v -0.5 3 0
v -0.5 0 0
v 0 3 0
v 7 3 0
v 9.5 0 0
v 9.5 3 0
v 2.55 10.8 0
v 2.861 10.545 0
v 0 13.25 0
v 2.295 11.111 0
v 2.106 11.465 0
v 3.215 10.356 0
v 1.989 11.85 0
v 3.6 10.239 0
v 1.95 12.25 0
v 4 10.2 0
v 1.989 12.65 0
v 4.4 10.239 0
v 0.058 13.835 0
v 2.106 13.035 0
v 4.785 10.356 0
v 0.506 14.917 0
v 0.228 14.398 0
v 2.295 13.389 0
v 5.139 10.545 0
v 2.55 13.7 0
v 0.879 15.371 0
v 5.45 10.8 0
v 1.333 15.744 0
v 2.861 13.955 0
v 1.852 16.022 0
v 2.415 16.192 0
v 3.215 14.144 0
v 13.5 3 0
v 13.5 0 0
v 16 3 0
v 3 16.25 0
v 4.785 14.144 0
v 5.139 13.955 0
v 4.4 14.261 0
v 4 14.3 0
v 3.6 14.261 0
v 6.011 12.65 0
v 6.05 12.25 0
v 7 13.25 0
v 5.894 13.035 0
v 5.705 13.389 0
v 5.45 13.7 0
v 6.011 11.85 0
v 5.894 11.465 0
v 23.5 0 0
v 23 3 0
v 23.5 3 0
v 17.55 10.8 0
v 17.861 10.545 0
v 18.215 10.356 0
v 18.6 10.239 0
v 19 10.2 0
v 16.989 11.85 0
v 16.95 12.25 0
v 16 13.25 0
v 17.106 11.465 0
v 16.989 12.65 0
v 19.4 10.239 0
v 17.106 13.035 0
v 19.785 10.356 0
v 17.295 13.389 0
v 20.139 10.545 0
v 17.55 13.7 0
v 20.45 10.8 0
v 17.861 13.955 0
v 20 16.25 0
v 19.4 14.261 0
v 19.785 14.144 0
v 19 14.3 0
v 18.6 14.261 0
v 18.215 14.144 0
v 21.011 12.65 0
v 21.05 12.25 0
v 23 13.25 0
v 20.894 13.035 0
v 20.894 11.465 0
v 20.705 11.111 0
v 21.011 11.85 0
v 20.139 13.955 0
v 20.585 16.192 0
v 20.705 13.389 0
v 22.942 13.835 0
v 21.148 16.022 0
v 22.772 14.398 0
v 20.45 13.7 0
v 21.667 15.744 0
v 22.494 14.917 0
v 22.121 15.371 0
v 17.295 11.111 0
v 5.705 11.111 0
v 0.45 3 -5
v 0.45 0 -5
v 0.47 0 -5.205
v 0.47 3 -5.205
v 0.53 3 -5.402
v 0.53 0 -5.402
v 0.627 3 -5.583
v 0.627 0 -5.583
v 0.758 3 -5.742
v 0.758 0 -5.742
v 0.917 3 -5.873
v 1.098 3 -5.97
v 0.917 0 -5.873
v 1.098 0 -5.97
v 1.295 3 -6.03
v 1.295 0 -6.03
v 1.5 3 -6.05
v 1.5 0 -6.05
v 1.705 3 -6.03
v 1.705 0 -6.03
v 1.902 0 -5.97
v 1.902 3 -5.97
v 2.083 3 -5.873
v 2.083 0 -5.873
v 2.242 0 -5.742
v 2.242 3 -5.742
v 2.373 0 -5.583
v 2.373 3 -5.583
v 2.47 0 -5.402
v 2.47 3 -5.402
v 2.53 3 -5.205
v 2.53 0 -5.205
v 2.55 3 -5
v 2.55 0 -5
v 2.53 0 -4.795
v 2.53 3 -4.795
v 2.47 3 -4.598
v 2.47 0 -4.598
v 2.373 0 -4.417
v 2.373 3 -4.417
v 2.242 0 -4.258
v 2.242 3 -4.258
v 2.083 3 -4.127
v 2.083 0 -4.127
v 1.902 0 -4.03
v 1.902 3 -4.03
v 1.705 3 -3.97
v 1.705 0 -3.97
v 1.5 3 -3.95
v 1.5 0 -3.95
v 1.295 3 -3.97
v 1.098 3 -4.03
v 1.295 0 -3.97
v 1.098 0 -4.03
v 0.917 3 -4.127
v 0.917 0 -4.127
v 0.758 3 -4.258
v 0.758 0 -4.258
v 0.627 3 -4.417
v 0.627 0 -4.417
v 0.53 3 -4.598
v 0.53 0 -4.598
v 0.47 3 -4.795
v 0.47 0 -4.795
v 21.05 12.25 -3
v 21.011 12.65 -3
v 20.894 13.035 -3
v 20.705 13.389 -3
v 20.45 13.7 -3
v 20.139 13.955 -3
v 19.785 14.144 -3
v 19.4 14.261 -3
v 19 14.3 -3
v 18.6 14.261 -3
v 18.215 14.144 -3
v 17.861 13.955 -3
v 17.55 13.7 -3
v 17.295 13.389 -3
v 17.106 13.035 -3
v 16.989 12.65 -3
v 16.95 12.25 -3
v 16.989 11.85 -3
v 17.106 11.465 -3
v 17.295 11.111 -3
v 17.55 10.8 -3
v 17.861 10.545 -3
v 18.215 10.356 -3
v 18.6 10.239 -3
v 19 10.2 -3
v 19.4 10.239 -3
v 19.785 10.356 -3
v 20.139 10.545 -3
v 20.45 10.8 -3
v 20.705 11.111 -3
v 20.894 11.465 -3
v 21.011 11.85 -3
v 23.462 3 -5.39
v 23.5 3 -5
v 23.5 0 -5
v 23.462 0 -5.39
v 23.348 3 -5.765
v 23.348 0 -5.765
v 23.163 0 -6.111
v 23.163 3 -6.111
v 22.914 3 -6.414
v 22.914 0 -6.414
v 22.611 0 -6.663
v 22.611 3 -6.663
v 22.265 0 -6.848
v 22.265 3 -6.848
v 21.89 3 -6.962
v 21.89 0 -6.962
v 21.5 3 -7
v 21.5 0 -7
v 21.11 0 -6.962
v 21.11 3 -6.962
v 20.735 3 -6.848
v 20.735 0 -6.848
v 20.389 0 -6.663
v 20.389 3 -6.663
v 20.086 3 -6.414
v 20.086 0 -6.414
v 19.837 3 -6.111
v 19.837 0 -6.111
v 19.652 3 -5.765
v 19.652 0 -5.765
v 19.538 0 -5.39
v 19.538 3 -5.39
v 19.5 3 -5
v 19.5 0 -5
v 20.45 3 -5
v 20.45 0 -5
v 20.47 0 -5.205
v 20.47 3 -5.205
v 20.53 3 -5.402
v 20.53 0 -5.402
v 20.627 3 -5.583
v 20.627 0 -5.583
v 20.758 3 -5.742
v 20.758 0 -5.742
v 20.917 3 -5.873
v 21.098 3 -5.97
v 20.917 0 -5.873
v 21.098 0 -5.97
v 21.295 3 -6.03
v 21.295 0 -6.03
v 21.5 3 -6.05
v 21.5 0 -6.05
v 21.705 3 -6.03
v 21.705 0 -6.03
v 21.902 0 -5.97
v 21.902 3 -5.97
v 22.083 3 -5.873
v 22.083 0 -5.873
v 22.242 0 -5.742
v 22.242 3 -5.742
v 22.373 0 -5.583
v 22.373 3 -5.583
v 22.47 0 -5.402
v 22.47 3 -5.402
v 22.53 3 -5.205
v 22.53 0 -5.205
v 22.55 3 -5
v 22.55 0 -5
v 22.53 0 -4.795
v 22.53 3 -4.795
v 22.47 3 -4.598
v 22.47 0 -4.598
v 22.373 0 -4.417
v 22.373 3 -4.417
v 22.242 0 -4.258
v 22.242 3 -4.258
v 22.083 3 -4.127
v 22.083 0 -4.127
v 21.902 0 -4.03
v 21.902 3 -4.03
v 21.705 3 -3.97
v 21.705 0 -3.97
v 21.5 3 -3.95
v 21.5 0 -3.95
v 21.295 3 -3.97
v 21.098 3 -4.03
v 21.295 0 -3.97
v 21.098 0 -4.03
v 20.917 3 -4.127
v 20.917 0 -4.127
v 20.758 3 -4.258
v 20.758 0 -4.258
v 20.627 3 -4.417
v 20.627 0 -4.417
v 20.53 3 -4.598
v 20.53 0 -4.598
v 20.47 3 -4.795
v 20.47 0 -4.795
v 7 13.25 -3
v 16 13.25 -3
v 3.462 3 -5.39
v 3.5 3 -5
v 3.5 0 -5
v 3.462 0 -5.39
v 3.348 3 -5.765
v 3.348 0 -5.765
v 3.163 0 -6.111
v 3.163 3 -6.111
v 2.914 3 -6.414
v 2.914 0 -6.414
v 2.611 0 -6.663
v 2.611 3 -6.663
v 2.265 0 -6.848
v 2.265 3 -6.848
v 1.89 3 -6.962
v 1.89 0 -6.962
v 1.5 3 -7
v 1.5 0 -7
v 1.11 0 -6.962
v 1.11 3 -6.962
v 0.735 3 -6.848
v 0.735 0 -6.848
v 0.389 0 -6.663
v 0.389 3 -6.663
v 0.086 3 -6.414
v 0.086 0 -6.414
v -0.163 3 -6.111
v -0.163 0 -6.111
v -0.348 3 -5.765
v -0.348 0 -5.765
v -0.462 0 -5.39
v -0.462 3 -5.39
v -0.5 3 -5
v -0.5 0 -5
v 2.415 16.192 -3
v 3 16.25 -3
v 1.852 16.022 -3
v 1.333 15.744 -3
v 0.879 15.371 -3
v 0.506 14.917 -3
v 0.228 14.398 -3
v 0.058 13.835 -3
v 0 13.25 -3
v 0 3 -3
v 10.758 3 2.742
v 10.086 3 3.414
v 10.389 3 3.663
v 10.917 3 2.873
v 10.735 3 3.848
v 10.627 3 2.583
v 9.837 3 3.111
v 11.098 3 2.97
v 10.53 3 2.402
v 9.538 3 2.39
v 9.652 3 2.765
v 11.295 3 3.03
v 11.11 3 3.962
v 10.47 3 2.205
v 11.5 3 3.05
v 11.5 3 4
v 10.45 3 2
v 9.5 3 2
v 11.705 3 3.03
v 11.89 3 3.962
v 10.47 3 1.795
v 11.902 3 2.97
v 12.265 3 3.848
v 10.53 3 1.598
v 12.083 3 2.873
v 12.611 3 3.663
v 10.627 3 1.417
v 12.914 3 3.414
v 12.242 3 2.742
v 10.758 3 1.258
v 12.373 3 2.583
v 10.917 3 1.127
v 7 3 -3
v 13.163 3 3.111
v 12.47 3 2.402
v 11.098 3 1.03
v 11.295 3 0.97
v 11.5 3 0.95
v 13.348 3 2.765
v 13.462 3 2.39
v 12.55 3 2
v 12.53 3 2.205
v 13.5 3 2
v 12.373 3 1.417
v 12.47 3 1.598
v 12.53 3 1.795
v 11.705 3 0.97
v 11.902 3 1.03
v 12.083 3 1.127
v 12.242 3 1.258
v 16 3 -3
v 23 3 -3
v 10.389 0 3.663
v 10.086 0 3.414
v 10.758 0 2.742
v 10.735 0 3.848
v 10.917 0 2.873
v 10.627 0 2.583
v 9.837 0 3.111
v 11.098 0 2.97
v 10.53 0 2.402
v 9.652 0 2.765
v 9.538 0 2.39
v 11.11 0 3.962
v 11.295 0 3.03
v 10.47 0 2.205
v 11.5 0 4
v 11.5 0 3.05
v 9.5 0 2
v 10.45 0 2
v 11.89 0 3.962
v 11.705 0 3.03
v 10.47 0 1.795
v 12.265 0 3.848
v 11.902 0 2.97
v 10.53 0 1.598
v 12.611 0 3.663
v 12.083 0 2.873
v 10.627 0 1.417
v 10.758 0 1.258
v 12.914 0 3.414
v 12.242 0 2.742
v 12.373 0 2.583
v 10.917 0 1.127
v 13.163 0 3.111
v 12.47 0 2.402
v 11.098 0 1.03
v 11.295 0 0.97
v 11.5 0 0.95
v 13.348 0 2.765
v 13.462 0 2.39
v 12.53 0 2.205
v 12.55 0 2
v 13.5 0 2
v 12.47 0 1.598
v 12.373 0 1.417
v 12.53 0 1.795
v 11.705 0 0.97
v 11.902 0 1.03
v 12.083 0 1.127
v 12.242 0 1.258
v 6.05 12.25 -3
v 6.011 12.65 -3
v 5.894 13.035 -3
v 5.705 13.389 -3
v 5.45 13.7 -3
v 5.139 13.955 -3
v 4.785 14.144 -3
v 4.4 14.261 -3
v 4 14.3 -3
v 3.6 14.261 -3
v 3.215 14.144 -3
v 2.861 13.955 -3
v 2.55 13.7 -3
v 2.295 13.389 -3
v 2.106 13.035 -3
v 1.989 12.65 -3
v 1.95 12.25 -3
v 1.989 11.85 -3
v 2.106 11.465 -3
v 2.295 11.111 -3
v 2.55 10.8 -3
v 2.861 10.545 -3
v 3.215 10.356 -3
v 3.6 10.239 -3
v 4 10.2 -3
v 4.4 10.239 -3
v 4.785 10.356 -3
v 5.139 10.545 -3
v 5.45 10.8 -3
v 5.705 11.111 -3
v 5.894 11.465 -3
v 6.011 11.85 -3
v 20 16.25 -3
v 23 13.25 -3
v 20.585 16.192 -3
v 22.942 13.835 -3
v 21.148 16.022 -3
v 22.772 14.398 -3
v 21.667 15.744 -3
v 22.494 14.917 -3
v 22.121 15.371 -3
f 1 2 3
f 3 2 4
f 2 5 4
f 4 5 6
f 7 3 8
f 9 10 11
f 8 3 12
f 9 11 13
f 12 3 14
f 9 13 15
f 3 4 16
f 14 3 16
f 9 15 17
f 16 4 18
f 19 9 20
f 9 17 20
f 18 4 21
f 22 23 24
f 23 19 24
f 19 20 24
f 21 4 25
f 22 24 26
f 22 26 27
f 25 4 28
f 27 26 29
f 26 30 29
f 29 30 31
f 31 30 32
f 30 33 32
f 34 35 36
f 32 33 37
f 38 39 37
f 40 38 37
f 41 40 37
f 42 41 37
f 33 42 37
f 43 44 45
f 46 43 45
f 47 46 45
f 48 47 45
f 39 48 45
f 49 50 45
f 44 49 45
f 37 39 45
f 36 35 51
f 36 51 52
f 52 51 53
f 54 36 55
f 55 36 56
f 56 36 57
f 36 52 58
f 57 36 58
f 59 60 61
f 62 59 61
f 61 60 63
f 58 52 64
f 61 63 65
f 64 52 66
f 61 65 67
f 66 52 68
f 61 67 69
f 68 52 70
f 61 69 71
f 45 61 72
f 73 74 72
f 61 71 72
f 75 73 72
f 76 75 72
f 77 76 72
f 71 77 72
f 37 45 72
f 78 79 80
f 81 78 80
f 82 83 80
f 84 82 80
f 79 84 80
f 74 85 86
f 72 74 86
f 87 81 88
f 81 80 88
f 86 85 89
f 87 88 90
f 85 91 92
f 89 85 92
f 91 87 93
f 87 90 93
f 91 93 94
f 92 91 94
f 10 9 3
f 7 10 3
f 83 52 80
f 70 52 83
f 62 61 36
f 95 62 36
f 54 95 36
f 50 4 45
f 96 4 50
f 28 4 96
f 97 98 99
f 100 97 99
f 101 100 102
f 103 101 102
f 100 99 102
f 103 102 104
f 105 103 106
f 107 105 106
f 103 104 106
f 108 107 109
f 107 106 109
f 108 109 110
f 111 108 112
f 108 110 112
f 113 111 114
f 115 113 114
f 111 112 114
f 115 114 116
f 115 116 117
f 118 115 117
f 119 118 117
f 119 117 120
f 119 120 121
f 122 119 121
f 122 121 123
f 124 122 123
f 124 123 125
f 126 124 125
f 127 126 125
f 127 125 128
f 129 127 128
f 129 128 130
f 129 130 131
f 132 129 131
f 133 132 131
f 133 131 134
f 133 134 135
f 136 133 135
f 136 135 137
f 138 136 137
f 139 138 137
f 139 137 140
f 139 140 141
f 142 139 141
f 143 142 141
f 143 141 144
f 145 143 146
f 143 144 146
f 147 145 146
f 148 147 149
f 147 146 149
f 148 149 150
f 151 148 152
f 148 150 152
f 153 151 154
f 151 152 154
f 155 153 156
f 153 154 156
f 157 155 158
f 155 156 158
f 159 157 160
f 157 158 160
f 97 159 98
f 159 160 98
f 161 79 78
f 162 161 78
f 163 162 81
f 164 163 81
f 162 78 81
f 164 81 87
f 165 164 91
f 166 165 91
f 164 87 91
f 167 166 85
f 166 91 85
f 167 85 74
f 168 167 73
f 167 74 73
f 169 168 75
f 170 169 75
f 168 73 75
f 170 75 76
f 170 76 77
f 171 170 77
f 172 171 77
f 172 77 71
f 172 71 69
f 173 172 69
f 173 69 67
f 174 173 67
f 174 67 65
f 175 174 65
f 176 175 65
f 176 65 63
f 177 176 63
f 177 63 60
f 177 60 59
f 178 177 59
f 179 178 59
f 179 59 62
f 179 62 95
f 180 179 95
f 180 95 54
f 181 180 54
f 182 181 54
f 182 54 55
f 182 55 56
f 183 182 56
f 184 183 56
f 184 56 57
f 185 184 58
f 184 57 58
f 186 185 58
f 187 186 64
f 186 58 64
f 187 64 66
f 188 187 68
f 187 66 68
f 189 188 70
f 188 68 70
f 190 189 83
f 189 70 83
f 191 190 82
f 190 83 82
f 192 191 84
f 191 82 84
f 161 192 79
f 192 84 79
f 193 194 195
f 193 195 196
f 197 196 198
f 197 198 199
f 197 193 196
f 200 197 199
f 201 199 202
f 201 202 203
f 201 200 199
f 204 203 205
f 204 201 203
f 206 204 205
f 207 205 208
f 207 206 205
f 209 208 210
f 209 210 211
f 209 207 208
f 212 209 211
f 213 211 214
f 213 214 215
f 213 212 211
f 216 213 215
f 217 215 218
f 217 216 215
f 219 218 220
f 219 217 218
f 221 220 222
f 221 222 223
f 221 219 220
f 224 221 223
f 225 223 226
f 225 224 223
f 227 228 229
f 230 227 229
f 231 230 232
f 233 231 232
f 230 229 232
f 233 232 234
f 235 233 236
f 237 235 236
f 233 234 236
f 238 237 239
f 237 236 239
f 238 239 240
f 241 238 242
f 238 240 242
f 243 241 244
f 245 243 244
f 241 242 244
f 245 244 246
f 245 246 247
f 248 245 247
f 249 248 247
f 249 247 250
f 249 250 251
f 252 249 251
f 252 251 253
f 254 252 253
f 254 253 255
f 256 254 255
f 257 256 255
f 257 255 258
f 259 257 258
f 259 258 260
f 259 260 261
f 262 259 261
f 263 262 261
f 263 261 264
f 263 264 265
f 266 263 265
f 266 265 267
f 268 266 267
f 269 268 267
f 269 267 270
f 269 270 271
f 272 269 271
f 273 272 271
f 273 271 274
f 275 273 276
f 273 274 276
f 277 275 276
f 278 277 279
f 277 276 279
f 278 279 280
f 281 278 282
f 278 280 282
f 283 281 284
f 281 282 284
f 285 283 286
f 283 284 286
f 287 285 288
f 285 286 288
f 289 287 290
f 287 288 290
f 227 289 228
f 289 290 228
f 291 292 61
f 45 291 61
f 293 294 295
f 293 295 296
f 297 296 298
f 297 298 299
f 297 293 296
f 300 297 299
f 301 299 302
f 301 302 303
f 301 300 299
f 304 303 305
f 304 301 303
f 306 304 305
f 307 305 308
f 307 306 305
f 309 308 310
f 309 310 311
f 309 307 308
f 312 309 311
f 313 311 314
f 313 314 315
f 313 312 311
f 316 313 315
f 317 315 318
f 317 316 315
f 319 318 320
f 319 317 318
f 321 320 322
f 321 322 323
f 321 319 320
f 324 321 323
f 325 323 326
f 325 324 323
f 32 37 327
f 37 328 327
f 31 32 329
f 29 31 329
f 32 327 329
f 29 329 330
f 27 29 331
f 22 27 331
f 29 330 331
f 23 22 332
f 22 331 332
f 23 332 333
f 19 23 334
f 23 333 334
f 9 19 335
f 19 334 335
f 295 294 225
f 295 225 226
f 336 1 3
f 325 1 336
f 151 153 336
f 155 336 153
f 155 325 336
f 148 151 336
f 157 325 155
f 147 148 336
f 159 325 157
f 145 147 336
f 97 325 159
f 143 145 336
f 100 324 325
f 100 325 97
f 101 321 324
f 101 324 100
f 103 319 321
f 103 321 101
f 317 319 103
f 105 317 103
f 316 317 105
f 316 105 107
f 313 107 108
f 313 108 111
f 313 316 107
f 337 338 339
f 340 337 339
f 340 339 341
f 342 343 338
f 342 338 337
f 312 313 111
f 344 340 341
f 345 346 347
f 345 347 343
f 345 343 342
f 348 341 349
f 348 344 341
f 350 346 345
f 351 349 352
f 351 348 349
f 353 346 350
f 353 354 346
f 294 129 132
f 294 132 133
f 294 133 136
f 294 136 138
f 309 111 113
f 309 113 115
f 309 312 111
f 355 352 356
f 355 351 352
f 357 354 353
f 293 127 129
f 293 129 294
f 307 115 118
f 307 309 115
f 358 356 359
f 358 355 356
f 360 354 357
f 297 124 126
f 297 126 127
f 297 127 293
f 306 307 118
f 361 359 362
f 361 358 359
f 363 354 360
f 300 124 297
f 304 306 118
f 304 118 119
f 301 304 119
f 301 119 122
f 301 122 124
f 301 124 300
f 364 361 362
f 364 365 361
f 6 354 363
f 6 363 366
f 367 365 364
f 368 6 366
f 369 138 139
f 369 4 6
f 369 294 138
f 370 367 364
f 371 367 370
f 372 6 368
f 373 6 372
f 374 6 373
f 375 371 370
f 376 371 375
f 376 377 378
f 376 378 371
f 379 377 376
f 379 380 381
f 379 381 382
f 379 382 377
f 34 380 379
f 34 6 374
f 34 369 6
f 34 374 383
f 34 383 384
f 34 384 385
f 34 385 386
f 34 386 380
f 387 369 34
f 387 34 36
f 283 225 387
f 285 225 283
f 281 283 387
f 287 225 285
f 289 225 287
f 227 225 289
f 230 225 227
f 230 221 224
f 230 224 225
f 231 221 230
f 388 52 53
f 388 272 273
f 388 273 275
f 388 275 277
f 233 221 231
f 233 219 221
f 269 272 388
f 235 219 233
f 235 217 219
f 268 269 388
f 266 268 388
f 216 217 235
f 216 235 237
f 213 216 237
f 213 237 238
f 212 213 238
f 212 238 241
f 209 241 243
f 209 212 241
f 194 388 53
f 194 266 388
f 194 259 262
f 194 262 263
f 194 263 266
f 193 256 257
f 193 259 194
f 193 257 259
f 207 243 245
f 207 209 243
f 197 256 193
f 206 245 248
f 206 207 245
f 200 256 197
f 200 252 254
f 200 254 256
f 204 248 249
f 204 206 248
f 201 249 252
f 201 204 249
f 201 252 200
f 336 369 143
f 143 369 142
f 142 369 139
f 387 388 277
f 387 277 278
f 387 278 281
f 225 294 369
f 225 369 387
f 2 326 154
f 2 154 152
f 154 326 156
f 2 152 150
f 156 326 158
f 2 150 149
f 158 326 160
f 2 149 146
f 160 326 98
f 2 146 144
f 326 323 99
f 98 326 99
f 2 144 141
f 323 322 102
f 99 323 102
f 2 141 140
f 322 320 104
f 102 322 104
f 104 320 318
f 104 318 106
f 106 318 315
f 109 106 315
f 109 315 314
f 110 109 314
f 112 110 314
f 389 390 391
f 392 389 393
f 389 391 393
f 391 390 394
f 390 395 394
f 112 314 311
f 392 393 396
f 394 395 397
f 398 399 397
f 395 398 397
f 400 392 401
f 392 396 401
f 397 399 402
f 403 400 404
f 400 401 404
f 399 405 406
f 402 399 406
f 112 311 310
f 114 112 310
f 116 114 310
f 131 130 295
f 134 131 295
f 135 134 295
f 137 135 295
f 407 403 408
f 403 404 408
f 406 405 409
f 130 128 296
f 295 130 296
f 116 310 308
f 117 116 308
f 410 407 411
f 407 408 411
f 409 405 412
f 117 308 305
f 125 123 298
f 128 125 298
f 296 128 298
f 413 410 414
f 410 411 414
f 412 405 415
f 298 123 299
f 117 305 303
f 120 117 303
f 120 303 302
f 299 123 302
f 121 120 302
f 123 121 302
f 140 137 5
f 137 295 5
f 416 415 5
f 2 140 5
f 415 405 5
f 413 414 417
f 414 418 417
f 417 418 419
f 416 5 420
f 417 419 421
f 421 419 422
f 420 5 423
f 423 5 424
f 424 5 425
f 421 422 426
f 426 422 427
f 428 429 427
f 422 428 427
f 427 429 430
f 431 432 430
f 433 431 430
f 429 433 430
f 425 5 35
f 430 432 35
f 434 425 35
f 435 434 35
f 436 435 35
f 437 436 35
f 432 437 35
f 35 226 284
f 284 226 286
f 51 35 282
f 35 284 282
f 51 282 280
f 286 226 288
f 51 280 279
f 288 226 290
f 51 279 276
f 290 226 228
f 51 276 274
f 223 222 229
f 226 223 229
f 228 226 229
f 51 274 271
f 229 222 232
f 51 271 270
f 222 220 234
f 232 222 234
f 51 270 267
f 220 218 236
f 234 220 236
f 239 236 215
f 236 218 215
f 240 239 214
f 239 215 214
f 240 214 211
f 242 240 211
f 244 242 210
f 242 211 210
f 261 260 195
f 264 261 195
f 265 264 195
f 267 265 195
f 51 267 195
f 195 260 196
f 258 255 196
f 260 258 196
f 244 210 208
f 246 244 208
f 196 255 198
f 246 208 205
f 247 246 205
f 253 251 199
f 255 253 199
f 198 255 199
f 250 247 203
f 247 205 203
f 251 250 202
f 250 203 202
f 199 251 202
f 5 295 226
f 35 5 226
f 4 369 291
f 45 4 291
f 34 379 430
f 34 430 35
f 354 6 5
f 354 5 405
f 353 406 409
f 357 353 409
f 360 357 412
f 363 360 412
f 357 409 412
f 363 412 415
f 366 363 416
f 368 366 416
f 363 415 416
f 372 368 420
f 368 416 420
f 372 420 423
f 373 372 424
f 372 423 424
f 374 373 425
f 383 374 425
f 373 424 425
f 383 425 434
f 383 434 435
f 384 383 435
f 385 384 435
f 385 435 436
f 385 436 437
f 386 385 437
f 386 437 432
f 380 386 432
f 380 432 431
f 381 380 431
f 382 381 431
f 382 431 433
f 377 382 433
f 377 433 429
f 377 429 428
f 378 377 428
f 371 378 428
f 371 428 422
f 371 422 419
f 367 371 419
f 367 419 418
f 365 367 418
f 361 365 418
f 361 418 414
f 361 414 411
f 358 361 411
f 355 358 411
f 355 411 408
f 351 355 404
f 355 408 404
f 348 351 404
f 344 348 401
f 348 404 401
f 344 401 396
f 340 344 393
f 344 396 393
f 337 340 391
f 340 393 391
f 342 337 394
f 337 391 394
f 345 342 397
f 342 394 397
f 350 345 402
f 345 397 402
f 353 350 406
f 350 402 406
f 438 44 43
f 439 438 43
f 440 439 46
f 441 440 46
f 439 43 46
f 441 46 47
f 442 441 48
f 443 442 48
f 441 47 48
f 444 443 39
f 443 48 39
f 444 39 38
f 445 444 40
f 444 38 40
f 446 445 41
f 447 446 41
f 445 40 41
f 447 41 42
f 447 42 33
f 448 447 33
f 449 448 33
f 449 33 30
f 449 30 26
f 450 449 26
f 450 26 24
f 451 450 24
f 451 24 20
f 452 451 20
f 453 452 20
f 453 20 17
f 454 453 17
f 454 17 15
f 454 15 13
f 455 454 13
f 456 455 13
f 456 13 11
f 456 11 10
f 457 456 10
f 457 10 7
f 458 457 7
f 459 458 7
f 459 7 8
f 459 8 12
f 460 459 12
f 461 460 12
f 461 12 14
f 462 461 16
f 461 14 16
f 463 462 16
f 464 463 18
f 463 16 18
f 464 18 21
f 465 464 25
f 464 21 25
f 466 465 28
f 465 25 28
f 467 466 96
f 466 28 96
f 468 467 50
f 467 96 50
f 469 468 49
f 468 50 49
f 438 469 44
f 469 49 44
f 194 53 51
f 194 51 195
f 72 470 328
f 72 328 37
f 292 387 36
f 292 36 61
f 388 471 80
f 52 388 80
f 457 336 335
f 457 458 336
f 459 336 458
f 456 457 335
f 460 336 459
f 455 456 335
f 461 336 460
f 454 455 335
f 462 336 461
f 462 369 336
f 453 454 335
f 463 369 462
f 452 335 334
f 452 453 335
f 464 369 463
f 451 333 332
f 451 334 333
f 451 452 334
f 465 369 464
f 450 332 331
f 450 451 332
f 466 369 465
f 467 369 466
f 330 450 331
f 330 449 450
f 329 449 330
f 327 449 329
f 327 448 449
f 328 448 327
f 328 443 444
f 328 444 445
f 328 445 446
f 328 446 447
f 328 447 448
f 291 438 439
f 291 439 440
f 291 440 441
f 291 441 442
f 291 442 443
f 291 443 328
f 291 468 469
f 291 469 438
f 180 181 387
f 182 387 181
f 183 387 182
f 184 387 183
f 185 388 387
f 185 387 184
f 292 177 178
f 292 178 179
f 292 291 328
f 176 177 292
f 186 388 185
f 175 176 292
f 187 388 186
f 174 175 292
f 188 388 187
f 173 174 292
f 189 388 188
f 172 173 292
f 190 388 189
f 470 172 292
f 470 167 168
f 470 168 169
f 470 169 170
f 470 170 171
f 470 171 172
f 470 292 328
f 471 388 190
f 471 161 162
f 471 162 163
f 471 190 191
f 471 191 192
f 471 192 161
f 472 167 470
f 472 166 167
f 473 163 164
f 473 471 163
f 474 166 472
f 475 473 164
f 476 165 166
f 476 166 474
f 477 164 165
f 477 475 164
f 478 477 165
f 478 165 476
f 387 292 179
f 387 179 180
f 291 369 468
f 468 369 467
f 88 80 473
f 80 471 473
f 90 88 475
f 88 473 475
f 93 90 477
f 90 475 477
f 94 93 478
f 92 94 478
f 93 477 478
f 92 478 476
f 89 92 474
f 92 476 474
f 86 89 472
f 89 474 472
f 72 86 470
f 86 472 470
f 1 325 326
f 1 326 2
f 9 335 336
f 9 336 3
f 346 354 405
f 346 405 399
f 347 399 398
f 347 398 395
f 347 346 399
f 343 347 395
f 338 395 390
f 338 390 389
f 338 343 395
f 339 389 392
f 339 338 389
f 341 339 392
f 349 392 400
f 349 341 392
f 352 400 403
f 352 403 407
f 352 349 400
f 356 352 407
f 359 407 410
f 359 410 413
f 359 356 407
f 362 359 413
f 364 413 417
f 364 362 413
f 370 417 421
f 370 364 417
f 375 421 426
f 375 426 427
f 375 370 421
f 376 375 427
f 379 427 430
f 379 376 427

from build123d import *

# Parameters (mm, degrees)
EXTRUDE_1_DEPTH         = 23
HOLE_WIZARD_4_1_4_1_1_D = 4.1
SKETCH_5_W              = 9
SKETCH_5_H              = 13.25
CUT_EXTRUDE_1_DEPTH     = 21
EXTRUDE_2_DEPTH         = 3
HOLE_WIZARD_2_1_2_1_1_D = 2.1
SKETCH_12_W             = 3
SKETCH_12_H             = 3
EXTRUDE_4_DEPTH         = 9
FILLET_1_R              = 3


with BuildPart() as part:
    # 草图1 → 凸台-拉伸1 (new body)
    with BuildSketch(Plane(origin=(0, 0, 0), x_dir=(0, 0, -1), z_dir=(1, 0, 0))):
        Polygon((0, 0), (0, 16.25), (3, 16.25), (3, 3), (5, 3), (5, 0), align=None)
    extrude(amount=EXTRUDE_1_DEPTH)

    # Ø4.1 (4.1) 直径孔1 (through all)
    with Locations(Plane(origin=(0, 0, -3), x_dir=(-1, 0, 0), z_dir=(0, 0, -1))):
        with Locations((-4, 12.25), (-19, 12.25)):
            Hole(HOLE_WIZARD_4_1_4_1_1_D / 2)

    # 草图5 → 切除-拉伸1 (cut)
    with BuildSketch(Plane(origin=(0, 0, -3), x_dir=(-1, 0, 0), z_dir=(0, 0, -1))):
        with Locations((-11.5, 9.625)):
            Rectangle(SKETCH_5_W, SKETCH_5_H)
    extrude(amount=-CUT_EXTRUDE_1_DEPTH, mode=Mode.SUBTRACT)

    # 草图6 → 凸台-拉伸2 (add)
    with BuildSketch(Plane(origin=(0, 3, 0), x_dir=(1, 0, 0), z_dir=(0, 1, 0))):
        with BuildLine():
            ThreePointArc((3.5, 5), (1.5, 7), (-0.5, 5))
            Line((-0.5, 5), (-0.5, 0))
            Line((-0.5, 0), (0, 0))
            Line((0, 0), (0, 5))
            Line((0, 5), (3.5, 5))
        make_face()
        with BuildLine():
            Line((9.5, 0), (9.5, -2))
            ThreePointArc((9.5, -2), (11.5, -4), (13.5, -2))
            Line((13.5, -2), (13.5, 0))
            Line((13.5, 0), (9.5, 0))
        make_face()
        with BuildLine():
            Line((23.5, 0), (23.5, 5))
            ThreePointArc((23.5, 5), (21.5, 7), (19.5, 5))
            Line((19.5, 5), (23, 5))
            Line((23, 5), (23, 0))
            Line((23, 0), (23.5, 0))
        make_face()
    extrude(amount=-EXTRUDE_2_DEPTH)

    # Ø2.1 (2.1) 直径孔1 (through all)
    with Locations(Plane(origin=(0, 3, 0), x_dir=(1, 0, 0), z_dir=(0, 1, 0))):
        with Locations((1.5, 5), (11.5, -2), (21.5, 5)):
            Hole(HOLE_WIZARD_2_1_2_1_1_D / 2)

    # 草图12 → 凸台-拉伸4 (add)
    with BuildSketch(Plane.ZY.offset(-16)):
        with Locations((-1.5, 14.75)):
            Rectangle(SKETCH_12_W, SKETCH_12_H)
    extrude(amount=EXTRUDE_4_DEPTH)

    # 圆角1
    fillet_1_edges = [part.edges().sort_by_distance(p)[0] for p in [
        (23, 16.25, -1.5),
        (0, 16.25, -1.5),
    ]]
    fillet(fillet_1_edges, radius=FILLET_1_R)


solid = part.part
